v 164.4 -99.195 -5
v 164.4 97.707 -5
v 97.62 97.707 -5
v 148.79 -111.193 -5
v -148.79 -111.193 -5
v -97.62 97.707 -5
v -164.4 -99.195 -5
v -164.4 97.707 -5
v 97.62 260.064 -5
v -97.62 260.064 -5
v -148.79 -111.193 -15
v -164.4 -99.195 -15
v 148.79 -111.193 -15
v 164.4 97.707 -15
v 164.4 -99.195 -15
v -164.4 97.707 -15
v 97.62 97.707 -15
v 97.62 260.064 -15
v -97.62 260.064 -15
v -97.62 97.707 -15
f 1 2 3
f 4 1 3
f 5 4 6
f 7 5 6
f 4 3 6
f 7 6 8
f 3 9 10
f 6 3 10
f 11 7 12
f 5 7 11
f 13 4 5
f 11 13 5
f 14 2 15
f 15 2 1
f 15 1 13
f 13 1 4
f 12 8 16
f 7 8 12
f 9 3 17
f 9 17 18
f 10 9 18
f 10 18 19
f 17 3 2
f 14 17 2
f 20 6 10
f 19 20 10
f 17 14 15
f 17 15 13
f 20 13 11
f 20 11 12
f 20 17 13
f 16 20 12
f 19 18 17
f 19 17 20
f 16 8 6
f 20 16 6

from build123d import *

# Parameters (mm, degrees)
PAD094_DEPTH = 10
SKETCH228_W  = 195.239
SKETCH228_H  = 162.3575
PAD117_DEPTH = 10


with BuildPart() as part:
    # Sketch187 → Pad094 (new body)
    with BuildSketch(Plane(origin=(0, 0, 0), x_dir=(-1, 0, 0), z_dir=(0, 0, -1))):
        Polygon((0, 97.7066), (164.4, 97.7066), (164.4, -99.195429), (148.790353, -111.193448), (0, -111.193448), align=None)
    pad094 = extrude(amount=PAD094_DEPTH)

    # Mirrored033: Pad094 across Sketch187 V_Axis
    add(pad094.mirror(Plane(origin=(0, 0, 0), x_dir=(0, 0, -1), z_dir=(-1, 0, 0))))

    # Sketch228 → Pad117 (join)
    with BuildSketch(Plane(origin=(0, 0, 0), x_dir=(-1, 0, 0), z_dir=(0, 0, -1))):
        with Locations((0, 178.88535)):
            Rectangle(SKETCH228_W, SKETCH228_H)
    extrude(amount=PAD117_DEPTH)


with BuildPart() as part_1:
    # Body072 placement: moved
    add(part.part.moved(Location((0, 0, -5))))


solid = part_1.part
